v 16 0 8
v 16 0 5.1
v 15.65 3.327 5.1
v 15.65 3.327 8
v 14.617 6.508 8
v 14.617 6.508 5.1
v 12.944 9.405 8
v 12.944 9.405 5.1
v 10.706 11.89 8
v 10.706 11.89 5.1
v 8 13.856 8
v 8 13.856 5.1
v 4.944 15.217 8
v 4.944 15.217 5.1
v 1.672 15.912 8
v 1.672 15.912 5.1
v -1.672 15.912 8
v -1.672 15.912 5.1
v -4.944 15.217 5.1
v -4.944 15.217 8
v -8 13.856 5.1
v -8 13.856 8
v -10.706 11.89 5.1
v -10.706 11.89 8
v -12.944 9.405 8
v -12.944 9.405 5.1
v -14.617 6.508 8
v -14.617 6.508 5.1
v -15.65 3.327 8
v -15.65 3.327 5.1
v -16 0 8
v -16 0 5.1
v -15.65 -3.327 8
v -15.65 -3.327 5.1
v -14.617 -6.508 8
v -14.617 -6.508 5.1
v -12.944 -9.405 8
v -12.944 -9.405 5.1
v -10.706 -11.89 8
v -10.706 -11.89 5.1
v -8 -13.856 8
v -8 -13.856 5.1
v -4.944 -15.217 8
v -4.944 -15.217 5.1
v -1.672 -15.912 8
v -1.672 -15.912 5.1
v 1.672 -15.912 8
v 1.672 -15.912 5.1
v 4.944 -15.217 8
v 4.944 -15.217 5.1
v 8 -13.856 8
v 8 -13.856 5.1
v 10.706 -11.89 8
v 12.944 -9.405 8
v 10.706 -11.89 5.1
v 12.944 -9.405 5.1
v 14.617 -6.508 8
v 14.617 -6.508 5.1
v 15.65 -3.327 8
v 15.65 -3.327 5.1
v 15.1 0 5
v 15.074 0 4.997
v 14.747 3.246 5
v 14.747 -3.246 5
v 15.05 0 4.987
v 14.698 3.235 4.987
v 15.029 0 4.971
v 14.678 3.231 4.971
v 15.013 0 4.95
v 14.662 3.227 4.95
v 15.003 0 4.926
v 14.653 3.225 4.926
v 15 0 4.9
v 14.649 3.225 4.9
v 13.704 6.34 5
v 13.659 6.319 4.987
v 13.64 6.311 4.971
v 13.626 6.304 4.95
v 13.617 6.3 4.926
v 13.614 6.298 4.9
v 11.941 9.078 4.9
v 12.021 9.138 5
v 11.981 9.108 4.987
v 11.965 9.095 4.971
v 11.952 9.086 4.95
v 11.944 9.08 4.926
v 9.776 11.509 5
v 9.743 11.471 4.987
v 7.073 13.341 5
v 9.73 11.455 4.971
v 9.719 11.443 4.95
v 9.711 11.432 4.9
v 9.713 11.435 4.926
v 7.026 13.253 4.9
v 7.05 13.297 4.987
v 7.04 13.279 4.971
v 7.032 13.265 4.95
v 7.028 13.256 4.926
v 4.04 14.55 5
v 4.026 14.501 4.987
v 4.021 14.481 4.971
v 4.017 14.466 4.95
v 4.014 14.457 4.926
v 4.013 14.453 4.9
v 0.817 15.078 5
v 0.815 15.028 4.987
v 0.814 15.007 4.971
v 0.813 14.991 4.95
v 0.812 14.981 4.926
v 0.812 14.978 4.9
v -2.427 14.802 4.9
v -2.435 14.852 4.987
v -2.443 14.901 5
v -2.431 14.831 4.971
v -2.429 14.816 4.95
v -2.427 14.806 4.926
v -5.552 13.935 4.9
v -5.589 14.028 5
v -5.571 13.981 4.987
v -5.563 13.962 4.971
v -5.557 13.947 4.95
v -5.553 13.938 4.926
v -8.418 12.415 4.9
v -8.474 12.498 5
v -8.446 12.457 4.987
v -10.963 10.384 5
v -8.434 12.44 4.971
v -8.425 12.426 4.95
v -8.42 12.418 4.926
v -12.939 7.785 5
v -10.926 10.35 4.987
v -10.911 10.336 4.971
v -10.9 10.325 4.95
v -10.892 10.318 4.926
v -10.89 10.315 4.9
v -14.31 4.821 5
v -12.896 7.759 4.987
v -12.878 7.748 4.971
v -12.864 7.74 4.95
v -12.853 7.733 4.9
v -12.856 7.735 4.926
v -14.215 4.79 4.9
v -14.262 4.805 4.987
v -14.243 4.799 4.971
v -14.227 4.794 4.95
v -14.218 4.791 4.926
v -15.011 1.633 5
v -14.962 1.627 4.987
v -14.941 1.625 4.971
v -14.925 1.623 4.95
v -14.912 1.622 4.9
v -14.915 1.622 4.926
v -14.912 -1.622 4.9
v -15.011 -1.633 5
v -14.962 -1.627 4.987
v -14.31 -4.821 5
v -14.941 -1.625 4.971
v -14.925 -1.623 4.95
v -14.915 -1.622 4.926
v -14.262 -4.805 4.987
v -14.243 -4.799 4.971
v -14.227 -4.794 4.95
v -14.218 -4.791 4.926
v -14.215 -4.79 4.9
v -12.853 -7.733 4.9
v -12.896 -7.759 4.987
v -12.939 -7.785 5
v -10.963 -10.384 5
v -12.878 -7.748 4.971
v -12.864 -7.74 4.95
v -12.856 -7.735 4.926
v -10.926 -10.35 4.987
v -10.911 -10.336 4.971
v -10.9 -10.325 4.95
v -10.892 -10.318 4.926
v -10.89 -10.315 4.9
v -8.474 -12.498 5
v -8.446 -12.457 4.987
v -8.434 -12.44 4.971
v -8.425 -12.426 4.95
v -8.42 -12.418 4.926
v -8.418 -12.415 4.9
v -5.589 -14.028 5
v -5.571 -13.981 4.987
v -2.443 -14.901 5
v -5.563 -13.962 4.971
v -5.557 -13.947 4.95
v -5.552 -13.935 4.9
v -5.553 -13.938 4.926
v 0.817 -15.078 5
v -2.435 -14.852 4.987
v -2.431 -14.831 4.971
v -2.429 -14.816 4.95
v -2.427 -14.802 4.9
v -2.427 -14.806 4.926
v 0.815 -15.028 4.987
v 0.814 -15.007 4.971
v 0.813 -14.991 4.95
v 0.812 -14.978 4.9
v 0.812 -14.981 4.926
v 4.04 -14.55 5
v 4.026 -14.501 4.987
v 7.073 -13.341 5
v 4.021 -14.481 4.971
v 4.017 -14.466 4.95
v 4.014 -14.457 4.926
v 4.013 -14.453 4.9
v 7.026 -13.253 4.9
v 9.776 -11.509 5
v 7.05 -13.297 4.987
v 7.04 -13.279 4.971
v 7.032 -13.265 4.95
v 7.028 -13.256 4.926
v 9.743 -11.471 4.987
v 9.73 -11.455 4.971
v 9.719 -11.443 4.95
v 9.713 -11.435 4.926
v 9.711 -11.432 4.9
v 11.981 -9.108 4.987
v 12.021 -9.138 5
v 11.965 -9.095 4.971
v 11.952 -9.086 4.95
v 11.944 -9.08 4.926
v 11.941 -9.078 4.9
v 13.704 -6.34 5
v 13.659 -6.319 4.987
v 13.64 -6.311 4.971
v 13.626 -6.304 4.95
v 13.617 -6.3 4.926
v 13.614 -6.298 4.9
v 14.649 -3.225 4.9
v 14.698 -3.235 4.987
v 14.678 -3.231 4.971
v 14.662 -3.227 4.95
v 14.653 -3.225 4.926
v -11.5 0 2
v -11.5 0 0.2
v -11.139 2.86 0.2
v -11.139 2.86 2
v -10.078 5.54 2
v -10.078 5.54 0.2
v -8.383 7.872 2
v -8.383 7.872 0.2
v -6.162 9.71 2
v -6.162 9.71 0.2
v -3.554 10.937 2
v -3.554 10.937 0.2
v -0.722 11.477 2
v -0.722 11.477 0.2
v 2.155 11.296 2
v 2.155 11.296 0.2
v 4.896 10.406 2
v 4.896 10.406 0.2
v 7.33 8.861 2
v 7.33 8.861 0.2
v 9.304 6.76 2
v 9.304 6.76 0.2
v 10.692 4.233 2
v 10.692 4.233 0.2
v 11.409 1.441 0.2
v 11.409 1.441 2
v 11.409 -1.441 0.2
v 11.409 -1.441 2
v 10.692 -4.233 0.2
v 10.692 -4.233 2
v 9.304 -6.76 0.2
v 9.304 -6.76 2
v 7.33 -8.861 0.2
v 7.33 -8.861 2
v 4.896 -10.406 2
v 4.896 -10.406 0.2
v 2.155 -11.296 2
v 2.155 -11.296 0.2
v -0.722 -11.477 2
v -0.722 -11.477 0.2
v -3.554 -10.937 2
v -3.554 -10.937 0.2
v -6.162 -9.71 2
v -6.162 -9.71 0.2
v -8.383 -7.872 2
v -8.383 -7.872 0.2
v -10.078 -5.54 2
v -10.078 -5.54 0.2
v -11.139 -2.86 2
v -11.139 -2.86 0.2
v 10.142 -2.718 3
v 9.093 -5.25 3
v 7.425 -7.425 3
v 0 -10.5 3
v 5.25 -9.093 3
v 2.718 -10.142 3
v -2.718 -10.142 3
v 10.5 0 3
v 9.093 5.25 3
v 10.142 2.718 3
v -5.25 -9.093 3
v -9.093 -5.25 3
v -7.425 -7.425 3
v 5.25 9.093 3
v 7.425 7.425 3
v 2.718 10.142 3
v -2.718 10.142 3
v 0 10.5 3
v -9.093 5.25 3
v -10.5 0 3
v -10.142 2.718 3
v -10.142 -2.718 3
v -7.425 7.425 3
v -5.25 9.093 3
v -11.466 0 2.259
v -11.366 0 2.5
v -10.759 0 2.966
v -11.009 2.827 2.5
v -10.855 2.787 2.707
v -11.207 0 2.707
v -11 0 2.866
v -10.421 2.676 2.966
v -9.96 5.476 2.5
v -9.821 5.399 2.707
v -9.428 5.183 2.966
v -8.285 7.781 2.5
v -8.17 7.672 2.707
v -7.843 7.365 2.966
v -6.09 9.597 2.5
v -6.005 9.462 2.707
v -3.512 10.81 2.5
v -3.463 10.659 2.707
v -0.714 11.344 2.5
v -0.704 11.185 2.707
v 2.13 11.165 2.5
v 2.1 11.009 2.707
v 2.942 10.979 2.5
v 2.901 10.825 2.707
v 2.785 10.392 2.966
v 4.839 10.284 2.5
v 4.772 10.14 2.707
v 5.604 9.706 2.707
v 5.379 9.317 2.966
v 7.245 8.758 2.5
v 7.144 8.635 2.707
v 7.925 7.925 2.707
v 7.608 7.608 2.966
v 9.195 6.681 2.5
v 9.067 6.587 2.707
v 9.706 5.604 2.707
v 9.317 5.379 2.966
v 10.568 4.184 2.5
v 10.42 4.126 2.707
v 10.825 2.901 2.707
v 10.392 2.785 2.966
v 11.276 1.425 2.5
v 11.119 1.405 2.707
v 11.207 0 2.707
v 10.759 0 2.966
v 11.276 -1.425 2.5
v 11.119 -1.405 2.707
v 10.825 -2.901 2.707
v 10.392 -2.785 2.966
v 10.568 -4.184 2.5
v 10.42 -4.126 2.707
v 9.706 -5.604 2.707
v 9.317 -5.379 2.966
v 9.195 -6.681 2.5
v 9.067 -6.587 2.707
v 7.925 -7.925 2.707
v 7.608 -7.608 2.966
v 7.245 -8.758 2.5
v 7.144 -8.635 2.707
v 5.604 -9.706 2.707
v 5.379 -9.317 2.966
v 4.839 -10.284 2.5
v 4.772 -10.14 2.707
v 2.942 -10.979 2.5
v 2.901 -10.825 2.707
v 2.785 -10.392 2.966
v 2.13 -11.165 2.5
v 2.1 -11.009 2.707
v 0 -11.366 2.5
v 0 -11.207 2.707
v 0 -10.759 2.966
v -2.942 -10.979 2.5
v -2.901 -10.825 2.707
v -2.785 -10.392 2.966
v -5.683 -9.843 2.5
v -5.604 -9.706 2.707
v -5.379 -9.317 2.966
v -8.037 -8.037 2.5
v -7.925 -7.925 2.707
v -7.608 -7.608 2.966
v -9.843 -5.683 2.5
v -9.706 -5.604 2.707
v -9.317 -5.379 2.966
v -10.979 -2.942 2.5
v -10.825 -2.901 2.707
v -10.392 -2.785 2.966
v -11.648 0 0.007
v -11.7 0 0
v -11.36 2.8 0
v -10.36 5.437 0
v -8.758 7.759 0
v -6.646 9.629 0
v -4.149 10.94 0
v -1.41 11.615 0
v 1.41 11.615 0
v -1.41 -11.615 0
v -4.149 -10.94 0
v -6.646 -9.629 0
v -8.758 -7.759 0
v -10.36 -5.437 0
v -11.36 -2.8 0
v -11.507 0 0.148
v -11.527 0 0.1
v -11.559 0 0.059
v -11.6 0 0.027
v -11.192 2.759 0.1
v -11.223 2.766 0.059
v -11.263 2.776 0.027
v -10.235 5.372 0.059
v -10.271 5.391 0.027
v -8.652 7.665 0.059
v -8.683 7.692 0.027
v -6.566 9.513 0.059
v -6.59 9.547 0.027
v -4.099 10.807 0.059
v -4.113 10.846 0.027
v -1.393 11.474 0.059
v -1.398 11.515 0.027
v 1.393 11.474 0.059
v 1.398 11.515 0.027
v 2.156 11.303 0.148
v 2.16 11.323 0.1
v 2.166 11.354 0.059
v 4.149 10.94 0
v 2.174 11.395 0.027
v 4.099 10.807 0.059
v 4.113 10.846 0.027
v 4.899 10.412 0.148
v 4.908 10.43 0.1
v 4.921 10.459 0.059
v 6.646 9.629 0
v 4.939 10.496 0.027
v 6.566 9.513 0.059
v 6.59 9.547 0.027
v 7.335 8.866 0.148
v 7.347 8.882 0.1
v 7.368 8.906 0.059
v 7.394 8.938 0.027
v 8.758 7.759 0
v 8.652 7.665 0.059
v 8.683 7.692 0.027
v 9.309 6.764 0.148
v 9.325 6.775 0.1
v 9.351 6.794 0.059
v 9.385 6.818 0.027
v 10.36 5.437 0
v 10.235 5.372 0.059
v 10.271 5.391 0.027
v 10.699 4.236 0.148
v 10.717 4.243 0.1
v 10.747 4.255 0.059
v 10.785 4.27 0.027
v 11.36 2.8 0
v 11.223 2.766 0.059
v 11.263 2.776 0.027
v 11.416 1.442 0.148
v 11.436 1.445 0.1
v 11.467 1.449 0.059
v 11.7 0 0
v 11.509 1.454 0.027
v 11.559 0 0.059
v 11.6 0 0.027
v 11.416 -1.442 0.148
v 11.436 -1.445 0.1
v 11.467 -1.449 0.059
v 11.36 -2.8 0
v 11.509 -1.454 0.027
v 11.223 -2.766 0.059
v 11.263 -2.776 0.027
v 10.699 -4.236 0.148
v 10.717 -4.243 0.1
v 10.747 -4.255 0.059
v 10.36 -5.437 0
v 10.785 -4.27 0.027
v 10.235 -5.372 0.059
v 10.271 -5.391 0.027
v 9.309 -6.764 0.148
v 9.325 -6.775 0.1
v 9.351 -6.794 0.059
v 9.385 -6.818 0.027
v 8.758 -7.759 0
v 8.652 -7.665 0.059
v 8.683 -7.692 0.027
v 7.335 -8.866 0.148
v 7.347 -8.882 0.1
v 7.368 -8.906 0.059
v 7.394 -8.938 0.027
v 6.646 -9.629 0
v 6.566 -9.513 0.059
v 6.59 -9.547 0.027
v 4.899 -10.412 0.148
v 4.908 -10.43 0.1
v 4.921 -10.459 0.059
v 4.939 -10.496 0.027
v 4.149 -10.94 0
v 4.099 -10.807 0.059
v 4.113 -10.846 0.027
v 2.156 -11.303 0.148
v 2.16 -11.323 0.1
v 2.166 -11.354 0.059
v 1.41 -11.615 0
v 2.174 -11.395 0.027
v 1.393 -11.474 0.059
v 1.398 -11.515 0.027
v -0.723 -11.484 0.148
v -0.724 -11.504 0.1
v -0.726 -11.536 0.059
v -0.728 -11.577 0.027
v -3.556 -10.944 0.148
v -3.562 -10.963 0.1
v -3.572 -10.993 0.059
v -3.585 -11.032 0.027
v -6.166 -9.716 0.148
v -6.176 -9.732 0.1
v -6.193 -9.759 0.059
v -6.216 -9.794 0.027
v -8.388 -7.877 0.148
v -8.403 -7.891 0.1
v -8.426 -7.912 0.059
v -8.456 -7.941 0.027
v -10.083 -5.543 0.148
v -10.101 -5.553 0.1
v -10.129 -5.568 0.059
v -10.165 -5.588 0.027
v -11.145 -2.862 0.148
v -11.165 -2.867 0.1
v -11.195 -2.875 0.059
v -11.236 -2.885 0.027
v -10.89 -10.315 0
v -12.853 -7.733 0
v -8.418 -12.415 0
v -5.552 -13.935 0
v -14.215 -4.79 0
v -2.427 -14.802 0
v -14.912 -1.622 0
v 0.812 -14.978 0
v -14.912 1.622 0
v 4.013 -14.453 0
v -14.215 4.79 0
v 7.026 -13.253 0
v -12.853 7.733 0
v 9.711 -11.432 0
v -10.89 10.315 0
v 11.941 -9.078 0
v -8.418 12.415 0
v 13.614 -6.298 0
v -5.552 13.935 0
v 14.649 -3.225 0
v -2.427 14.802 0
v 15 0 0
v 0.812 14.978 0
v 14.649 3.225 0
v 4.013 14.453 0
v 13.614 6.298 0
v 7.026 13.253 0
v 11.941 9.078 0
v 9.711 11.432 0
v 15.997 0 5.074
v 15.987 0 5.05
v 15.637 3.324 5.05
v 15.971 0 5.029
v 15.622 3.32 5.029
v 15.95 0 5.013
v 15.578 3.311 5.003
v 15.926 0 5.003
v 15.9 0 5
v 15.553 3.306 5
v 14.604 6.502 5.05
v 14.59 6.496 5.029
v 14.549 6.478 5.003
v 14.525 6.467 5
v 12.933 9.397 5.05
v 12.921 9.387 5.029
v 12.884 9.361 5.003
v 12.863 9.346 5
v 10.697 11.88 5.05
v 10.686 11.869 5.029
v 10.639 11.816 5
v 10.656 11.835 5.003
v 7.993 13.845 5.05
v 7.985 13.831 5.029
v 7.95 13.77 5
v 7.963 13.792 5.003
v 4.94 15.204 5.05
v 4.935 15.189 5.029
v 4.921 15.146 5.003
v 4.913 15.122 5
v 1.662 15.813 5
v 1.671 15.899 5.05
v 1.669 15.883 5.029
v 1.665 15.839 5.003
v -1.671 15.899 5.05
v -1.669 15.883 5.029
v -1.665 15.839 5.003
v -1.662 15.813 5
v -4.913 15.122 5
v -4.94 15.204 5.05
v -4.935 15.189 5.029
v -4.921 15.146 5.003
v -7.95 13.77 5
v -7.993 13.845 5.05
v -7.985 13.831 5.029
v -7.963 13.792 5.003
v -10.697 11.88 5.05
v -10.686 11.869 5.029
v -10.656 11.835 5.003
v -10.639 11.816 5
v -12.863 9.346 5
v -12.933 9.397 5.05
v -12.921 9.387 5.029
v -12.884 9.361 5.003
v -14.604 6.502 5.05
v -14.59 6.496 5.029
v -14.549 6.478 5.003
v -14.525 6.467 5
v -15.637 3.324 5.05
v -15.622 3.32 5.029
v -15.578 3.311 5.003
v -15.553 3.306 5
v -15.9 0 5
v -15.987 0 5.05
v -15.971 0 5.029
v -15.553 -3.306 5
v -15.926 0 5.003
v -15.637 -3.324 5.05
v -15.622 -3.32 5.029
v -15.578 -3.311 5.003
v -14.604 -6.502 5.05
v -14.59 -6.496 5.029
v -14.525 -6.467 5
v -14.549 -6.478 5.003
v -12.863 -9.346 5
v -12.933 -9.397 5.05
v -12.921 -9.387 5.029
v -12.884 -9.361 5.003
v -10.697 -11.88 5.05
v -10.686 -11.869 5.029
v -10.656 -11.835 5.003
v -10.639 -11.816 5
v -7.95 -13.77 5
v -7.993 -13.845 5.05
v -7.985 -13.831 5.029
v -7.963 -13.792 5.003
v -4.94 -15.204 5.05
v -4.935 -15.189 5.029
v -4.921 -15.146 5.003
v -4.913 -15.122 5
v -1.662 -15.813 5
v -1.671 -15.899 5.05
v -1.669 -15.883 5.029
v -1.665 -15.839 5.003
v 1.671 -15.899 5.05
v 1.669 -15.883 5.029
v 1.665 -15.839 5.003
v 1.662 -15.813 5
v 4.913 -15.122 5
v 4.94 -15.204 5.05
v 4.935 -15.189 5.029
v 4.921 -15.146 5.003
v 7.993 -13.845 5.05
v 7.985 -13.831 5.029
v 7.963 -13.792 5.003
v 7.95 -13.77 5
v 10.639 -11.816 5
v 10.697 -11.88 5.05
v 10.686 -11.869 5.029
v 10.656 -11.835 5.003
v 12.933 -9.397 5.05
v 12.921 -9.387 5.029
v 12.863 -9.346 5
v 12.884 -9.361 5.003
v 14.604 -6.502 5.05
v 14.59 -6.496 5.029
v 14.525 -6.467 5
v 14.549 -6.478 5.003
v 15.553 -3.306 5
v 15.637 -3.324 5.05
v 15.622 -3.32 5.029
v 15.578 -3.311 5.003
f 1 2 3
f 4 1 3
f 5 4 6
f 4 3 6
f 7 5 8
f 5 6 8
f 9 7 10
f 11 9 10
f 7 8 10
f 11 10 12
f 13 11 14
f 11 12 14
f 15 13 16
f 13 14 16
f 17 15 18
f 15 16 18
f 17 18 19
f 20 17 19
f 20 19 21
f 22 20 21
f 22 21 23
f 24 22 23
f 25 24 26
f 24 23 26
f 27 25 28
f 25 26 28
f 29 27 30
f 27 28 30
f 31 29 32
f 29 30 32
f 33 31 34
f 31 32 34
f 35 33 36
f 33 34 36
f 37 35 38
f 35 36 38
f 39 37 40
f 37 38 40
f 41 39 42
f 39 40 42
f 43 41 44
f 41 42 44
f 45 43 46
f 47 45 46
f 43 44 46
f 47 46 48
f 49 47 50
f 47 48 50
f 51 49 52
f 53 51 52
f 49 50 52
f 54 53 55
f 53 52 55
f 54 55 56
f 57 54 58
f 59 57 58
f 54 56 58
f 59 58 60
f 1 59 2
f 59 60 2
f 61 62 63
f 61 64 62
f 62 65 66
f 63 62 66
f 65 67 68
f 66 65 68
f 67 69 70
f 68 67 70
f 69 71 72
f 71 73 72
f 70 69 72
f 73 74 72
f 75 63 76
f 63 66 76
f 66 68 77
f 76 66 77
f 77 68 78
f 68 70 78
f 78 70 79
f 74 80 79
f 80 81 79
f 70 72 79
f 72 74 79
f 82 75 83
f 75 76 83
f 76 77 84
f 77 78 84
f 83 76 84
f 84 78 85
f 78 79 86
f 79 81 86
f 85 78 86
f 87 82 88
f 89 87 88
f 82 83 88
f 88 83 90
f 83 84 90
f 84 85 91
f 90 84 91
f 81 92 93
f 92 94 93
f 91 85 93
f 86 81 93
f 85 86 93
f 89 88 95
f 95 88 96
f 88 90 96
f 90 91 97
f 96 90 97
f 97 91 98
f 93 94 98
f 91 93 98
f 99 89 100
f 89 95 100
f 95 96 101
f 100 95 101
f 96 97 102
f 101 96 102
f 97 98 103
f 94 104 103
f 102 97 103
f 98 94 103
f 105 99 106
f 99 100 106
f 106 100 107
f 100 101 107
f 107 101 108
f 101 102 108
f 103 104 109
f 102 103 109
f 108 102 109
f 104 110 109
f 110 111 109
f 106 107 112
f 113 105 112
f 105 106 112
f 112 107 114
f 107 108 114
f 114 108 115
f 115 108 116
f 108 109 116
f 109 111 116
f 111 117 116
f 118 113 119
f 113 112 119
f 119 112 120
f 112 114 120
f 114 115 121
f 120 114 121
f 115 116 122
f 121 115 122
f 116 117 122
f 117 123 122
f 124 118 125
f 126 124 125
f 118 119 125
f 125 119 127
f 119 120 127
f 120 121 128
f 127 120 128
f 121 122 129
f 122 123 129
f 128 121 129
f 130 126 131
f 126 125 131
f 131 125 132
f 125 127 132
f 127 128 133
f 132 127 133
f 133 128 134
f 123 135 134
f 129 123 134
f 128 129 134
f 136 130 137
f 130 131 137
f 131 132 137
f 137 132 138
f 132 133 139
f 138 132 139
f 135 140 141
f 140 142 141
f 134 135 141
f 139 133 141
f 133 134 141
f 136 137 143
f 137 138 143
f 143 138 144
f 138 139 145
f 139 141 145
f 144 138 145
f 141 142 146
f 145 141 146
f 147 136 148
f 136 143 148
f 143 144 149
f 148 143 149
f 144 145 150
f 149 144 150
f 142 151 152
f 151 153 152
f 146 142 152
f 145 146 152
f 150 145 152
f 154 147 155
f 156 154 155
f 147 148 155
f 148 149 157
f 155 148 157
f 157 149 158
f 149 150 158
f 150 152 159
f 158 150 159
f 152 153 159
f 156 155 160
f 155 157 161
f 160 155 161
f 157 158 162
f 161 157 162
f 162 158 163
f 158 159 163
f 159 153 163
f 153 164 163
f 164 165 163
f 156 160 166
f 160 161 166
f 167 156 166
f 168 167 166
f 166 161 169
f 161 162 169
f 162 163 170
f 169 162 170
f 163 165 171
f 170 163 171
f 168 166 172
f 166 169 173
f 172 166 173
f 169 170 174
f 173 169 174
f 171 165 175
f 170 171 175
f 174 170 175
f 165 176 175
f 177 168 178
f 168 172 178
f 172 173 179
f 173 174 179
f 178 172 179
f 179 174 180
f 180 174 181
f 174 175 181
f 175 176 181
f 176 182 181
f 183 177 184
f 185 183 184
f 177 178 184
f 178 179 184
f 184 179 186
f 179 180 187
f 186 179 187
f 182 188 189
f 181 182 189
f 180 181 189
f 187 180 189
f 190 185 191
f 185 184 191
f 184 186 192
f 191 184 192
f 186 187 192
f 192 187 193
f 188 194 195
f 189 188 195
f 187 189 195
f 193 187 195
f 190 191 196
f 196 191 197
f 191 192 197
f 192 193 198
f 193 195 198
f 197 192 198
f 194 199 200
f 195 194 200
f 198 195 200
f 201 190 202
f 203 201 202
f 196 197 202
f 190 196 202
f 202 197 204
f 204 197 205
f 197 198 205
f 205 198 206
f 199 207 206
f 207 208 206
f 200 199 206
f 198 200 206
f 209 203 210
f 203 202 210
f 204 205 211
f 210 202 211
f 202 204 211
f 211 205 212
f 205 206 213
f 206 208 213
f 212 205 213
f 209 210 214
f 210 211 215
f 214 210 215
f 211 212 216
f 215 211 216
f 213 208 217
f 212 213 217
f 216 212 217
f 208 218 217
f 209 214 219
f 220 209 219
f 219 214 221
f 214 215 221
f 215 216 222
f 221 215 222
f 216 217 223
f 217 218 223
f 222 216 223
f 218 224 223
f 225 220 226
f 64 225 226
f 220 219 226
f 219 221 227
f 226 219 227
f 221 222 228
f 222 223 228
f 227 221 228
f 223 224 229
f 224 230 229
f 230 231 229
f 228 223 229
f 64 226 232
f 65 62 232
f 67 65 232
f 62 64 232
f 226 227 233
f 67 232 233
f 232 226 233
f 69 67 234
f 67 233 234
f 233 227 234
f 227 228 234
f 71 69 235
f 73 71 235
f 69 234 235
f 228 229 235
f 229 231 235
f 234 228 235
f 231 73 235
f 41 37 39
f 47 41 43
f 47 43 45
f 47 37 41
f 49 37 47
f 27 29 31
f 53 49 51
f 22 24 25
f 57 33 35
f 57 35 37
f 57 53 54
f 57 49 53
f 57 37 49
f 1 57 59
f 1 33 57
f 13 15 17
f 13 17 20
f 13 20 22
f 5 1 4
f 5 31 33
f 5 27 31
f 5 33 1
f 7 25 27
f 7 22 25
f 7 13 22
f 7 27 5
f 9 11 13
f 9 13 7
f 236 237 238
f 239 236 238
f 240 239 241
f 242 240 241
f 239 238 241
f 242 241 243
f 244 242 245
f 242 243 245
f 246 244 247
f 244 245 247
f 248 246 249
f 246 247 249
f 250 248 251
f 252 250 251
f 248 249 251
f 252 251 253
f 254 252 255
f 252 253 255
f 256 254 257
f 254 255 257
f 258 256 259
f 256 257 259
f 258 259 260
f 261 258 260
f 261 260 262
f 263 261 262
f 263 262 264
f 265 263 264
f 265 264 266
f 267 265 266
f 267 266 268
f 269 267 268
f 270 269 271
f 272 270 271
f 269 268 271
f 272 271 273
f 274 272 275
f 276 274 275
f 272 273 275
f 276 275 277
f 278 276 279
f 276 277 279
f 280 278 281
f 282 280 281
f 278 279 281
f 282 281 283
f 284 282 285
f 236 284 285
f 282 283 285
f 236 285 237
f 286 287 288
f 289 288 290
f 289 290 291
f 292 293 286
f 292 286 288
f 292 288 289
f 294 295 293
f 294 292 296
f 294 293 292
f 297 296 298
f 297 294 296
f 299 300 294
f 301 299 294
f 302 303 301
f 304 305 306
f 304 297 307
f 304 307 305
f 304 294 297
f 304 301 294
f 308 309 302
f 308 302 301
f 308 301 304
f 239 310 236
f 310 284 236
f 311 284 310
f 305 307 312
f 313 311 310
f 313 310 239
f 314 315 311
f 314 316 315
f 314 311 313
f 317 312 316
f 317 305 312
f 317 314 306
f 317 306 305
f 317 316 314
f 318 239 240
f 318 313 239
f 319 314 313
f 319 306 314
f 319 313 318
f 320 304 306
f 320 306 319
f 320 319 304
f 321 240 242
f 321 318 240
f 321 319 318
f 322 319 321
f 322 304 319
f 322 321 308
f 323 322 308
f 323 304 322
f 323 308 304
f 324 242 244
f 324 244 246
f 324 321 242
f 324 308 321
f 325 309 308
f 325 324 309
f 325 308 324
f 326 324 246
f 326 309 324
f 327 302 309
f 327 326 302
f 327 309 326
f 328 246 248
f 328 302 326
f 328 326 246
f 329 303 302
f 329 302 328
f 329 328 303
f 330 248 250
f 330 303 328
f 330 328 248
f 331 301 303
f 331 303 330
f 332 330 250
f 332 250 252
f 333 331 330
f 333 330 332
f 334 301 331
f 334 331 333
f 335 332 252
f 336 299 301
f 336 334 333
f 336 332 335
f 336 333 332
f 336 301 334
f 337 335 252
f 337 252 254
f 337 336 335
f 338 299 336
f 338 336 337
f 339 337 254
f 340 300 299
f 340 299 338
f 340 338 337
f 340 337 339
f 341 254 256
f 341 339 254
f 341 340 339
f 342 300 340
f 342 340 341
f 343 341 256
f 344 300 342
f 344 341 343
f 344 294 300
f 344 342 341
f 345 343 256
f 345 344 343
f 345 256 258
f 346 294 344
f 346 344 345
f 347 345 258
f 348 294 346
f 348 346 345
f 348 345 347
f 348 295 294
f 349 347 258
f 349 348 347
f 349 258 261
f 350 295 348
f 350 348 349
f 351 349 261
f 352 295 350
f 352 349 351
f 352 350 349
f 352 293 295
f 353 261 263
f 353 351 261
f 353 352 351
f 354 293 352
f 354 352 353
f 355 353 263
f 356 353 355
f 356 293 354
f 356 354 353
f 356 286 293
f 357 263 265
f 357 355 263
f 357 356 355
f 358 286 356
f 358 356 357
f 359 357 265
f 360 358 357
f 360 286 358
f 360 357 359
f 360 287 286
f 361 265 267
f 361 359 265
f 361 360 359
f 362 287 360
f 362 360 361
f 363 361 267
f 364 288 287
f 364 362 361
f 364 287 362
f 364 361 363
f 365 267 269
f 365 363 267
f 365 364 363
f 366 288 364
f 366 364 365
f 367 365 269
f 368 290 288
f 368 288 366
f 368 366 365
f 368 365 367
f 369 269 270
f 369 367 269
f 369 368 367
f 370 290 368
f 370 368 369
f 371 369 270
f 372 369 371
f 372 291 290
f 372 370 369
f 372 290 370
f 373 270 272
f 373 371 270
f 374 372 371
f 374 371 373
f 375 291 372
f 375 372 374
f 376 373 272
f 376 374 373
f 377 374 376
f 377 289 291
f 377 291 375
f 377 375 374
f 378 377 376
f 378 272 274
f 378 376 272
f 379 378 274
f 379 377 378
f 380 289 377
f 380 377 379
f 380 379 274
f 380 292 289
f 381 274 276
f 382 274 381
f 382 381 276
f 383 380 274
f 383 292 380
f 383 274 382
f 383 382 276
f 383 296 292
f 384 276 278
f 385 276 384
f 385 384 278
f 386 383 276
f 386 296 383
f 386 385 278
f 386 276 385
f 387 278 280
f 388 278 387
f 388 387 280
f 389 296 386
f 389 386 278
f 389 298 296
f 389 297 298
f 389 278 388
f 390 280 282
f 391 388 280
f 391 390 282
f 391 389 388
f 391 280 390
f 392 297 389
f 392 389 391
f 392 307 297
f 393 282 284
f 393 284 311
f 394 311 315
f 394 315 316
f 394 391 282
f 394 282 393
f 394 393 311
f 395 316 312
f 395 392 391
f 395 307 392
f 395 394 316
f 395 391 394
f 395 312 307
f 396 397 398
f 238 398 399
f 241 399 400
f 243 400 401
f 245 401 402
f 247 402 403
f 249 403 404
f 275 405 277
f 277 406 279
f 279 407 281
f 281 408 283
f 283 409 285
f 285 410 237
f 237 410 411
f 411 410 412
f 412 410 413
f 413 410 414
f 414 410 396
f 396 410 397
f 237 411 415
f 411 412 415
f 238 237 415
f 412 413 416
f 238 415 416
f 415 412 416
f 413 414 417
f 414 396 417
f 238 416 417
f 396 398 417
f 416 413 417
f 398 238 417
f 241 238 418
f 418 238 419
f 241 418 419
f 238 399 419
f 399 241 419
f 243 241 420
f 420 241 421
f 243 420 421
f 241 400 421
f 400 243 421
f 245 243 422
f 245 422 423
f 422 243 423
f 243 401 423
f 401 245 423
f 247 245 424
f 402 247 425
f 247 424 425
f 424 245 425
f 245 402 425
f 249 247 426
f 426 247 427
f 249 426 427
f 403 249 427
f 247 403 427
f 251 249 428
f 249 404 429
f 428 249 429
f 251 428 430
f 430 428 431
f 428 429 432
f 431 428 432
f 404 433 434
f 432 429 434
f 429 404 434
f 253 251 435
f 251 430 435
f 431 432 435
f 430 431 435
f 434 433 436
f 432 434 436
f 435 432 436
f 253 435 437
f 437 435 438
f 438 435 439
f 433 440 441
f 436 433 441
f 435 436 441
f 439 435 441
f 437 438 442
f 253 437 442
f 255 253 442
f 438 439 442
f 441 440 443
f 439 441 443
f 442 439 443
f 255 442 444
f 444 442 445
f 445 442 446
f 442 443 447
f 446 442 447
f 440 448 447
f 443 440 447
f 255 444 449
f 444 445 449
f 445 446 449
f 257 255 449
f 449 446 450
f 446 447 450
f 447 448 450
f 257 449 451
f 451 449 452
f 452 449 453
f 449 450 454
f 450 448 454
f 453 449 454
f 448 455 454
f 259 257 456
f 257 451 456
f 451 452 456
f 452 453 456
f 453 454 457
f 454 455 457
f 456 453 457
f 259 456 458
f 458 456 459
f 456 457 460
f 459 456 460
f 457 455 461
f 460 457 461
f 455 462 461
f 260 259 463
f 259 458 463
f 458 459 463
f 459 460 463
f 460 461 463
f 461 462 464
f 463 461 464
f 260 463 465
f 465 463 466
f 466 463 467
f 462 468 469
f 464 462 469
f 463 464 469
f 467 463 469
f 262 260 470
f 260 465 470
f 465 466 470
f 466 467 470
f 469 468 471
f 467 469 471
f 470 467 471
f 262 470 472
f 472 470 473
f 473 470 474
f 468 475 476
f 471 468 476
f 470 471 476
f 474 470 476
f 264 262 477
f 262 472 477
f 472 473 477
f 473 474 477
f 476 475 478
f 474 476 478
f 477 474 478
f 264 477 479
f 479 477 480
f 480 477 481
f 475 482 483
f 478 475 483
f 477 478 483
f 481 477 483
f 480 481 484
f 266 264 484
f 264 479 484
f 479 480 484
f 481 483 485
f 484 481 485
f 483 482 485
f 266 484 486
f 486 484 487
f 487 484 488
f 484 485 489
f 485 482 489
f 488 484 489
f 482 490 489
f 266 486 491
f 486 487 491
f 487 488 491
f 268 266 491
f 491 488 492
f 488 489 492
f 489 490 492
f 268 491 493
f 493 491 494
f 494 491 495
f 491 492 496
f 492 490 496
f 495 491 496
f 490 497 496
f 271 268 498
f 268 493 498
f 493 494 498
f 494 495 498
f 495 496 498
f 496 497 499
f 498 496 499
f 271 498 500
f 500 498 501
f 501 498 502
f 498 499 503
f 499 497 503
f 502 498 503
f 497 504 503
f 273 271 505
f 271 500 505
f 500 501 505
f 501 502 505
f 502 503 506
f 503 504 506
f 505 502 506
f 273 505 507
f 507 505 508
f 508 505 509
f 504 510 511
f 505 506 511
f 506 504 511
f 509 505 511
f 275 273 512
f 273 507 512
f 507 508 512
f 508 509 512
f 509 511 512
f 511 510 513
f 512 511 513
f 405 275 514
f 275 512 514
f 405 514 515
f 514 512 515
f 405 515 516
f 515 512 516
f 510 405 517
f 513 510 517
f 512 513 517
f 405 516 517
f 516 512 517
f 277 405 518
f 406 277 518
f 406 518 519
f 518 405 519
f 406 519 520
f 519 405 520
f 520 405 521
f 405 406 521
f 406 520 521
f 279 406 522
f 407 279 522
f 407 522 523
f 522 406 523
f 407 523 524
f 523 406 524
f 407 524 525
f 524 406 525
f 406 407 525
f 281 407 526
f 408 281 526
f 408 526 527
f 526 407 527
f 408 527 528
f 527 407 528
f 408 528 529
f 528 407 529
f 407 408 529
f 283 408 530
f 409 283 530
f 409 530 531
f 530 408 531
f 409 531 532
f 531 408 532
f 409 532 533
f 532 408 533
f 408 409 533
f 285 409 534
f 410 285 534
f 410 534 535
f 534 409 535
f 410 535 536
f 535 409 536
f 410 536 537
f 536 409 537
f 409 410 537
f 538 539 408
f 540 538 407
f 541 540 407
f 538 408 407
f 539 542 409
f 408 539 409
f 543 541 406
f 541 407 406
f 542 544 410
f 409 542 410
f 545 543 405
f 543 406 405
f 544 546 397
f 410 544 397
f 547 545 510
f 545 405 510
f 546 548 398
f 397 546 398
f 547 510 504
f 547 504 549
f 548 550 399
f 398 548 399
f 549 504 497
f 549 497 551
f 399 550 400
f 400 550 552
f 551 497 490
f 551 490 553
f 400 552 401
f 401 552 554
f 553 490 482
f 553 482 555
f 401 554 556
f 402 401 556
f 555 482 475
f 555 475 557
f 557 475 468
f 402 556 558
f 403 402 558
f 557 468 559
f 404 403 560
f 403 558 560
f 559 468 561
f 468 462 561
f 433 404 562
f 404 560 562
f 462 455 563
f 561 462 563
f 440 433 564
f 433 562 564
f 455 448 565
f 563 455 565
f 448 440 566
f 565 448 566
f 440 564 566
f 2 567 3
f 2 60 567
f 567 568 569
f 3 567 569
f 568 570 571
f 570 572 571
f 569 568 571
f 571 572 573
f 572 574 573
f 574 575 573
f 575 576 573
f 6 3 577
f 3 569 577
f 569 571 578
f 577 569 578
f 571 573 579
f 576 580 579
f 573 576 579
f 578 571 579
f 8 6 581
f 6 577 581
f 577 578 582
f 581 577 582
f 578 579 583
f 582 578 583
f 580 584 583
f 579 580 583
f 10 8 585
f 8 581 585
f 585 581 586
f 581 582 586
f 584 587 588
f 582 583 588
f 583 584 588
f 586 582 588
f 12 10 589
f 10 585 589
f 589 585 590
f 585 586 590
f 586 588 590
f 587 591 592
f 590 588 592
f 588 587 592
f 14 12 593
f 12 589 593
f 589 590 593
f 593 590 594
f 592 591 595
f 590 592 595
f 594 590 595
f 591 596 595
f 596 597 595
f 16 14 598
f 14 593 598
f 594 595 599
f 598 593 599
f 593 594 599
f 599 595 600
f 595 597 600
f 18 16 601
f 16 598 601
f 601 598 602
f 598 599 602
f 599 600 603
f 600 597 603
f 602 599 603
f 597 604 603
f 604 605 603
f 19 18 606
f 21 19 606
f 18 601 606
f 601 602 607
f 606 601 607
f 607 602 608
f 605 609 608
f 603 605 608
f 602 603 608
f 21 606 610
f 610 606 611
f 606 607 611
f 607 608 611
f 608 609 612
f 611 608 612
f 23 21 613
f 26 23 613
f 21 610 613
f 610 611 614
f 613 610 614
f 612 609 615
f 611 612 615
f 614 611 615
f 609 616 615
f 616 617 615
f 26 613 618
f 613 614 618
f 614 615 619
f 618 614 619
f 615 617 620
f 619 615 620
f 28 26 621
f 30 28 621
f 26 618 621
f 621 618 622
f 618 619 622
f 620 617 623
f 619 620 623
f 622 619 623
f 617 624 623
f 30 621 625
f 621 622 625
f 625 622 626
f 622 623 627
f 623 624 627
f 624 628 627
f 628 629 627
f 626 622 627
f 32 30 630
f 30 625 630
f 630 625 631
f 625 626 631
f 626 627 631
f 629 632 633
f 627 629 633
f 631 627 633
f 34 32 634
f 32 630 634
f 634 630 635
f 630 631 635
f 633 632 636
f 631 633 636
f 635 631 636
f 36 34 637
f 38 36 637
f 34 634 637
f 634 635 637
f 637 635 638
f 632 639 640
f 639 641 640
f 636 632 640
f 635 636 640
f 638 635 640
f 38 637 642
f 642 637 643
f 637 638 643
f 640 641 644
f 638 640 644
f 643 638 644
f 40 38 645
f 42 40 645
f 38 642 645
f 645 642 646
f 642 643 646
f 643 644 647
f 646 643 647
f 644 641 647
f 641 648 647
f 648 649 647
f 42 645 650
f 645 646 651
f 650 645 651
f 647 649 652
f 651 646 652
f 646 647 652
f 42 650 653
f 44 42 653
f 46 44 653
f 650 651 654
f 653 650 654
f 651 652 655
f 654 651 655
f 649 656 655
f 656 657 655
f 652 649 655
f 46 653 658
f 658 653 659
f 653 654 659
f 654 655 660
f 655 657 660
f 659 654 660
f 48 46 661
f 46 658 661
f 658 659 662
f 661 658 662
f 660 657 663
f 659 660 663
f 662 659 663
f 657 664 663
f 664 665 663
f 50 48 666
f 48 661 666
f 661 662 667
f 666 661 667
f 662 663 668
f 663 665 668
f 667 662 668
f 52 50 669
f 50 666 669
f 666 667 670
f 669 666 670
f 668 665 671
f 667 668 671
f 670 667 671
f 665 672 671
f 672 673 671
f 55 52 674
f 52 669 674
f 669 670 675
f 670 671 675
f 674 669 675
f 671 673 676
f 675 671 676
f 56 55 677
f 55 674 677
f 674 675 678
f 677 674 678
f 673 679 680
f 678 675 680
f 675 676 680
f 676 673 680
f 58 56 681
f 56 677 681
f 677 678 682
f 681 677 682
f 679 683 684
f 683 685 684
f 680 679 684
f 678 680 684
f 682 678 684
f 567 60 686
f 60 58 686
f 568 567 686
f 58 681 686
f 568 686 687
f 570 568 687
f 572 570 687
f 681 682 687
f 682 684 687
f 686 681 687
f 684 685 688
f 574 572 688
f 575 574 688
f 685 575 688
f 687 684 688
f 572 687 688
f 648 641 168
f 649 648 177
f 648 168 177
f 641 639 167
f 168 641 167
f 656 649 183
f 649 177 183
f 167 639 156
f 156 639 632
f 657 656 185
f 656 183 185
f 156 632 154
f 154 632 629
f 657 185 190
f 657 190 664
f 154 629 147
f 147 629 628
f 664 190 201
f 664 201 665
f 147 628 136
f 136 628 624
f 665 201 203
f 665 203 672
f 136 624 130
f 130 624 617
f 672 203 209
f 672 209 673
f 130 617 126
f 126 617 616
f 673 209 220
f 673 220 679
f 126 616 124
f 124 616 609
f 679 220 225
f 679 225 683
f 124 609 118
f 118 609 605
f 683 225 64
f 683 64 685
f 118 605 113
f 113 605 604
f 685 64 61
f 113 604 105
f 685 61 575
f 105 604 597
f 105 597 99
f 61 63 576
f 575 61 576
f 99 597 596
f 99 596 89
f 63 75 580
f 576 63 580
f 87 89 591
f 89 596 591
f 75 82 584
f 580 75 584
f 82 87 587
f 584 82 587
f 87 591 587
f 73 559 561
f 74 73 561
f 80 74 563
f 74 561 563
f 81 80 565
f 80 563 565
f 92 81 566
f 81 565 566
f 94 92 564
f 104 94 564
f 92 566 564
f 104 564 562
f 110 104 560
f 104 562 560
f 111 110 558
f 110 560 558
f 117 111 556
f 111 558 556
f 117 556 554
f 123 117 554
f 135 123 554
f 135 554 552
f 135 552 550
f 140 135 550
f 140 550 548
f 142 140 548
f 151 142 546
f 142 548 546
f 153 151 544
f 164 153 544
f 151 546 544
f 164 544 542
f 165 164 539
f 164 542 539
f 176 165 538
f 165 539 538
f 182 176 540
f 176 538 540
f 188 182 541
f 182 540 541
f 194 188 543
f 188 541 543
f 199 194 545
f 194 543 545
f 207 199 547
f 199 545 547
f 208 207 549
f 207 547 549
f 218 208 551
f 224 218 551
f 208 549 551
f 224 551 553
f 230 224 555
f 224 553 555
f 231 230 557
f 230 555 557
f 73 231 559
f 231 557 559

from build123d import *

# Parameters (mm, degrees)
SKETCH3_R           = 15
BOSS_EXTRUDE1_DEPTH = 5
SKETCH4_R           = 11.5
CUT_EXTRUDE1_DEPTH  = 3
FILLET1_R           = 1
FILLET2_R           = 0.2
SKETCH5_R           = 16
BOSS_EXTRUDE2_DEPTH = 3
FILLET3_R           = 0.1


with BuildPart() as part:
    # Sketch3 → Boss-Extrude1 (new body)
    with BuildSketch(Plane.XY):
        Circle(SKETCH3_R)
    extrude(amount=BOSS_EXTRUDE1_DEPTH)

    # Sketch4 → Cut-Extrude1 (cut)
    with BuildSketch(Plane(origin=(0, 0, 0), x_dir=(-1, 0, 0), z_dir=(0, 0, -1))):
        Circle(SKETCH4_R)
    extrude(amount=-CUT_EXTRUDE1_DEPTH, mode=Mode.SUBTRACT)

    # Fillet1
    fillet1_edges = [part.edges().sort_by_distance(p)[0] for p in [
        (11.5, 0, 3),
    ]]
    fillet(fillet1_edges, radius=FILLET1_R)

    # Fillet2
    fillet2_edges = [part.edges().sort_by_distance(p)[0] for p in [
        (11.5, 0, 0),
    ]]
    fillet(fillet2_edges, radius=FILLET2_R)

    # Sketch5 → Boss-Extrude2 (add)
    with BuildSketch(Plane.XY.offset(5)):
        Circle(SKETCH5_R)
    extrude(amount=BOSS_EXTRUDE2_DEPTH)

    # Fillet3
    fillet3_edges = [part.edges().sort_by_distance(p)[0] for p in [
        (-16, 0, 5),
        (-15, 0, 5),
    ]]
    fillet(fillet3_edges, radius=FILLET3_R)


solid = part.part
